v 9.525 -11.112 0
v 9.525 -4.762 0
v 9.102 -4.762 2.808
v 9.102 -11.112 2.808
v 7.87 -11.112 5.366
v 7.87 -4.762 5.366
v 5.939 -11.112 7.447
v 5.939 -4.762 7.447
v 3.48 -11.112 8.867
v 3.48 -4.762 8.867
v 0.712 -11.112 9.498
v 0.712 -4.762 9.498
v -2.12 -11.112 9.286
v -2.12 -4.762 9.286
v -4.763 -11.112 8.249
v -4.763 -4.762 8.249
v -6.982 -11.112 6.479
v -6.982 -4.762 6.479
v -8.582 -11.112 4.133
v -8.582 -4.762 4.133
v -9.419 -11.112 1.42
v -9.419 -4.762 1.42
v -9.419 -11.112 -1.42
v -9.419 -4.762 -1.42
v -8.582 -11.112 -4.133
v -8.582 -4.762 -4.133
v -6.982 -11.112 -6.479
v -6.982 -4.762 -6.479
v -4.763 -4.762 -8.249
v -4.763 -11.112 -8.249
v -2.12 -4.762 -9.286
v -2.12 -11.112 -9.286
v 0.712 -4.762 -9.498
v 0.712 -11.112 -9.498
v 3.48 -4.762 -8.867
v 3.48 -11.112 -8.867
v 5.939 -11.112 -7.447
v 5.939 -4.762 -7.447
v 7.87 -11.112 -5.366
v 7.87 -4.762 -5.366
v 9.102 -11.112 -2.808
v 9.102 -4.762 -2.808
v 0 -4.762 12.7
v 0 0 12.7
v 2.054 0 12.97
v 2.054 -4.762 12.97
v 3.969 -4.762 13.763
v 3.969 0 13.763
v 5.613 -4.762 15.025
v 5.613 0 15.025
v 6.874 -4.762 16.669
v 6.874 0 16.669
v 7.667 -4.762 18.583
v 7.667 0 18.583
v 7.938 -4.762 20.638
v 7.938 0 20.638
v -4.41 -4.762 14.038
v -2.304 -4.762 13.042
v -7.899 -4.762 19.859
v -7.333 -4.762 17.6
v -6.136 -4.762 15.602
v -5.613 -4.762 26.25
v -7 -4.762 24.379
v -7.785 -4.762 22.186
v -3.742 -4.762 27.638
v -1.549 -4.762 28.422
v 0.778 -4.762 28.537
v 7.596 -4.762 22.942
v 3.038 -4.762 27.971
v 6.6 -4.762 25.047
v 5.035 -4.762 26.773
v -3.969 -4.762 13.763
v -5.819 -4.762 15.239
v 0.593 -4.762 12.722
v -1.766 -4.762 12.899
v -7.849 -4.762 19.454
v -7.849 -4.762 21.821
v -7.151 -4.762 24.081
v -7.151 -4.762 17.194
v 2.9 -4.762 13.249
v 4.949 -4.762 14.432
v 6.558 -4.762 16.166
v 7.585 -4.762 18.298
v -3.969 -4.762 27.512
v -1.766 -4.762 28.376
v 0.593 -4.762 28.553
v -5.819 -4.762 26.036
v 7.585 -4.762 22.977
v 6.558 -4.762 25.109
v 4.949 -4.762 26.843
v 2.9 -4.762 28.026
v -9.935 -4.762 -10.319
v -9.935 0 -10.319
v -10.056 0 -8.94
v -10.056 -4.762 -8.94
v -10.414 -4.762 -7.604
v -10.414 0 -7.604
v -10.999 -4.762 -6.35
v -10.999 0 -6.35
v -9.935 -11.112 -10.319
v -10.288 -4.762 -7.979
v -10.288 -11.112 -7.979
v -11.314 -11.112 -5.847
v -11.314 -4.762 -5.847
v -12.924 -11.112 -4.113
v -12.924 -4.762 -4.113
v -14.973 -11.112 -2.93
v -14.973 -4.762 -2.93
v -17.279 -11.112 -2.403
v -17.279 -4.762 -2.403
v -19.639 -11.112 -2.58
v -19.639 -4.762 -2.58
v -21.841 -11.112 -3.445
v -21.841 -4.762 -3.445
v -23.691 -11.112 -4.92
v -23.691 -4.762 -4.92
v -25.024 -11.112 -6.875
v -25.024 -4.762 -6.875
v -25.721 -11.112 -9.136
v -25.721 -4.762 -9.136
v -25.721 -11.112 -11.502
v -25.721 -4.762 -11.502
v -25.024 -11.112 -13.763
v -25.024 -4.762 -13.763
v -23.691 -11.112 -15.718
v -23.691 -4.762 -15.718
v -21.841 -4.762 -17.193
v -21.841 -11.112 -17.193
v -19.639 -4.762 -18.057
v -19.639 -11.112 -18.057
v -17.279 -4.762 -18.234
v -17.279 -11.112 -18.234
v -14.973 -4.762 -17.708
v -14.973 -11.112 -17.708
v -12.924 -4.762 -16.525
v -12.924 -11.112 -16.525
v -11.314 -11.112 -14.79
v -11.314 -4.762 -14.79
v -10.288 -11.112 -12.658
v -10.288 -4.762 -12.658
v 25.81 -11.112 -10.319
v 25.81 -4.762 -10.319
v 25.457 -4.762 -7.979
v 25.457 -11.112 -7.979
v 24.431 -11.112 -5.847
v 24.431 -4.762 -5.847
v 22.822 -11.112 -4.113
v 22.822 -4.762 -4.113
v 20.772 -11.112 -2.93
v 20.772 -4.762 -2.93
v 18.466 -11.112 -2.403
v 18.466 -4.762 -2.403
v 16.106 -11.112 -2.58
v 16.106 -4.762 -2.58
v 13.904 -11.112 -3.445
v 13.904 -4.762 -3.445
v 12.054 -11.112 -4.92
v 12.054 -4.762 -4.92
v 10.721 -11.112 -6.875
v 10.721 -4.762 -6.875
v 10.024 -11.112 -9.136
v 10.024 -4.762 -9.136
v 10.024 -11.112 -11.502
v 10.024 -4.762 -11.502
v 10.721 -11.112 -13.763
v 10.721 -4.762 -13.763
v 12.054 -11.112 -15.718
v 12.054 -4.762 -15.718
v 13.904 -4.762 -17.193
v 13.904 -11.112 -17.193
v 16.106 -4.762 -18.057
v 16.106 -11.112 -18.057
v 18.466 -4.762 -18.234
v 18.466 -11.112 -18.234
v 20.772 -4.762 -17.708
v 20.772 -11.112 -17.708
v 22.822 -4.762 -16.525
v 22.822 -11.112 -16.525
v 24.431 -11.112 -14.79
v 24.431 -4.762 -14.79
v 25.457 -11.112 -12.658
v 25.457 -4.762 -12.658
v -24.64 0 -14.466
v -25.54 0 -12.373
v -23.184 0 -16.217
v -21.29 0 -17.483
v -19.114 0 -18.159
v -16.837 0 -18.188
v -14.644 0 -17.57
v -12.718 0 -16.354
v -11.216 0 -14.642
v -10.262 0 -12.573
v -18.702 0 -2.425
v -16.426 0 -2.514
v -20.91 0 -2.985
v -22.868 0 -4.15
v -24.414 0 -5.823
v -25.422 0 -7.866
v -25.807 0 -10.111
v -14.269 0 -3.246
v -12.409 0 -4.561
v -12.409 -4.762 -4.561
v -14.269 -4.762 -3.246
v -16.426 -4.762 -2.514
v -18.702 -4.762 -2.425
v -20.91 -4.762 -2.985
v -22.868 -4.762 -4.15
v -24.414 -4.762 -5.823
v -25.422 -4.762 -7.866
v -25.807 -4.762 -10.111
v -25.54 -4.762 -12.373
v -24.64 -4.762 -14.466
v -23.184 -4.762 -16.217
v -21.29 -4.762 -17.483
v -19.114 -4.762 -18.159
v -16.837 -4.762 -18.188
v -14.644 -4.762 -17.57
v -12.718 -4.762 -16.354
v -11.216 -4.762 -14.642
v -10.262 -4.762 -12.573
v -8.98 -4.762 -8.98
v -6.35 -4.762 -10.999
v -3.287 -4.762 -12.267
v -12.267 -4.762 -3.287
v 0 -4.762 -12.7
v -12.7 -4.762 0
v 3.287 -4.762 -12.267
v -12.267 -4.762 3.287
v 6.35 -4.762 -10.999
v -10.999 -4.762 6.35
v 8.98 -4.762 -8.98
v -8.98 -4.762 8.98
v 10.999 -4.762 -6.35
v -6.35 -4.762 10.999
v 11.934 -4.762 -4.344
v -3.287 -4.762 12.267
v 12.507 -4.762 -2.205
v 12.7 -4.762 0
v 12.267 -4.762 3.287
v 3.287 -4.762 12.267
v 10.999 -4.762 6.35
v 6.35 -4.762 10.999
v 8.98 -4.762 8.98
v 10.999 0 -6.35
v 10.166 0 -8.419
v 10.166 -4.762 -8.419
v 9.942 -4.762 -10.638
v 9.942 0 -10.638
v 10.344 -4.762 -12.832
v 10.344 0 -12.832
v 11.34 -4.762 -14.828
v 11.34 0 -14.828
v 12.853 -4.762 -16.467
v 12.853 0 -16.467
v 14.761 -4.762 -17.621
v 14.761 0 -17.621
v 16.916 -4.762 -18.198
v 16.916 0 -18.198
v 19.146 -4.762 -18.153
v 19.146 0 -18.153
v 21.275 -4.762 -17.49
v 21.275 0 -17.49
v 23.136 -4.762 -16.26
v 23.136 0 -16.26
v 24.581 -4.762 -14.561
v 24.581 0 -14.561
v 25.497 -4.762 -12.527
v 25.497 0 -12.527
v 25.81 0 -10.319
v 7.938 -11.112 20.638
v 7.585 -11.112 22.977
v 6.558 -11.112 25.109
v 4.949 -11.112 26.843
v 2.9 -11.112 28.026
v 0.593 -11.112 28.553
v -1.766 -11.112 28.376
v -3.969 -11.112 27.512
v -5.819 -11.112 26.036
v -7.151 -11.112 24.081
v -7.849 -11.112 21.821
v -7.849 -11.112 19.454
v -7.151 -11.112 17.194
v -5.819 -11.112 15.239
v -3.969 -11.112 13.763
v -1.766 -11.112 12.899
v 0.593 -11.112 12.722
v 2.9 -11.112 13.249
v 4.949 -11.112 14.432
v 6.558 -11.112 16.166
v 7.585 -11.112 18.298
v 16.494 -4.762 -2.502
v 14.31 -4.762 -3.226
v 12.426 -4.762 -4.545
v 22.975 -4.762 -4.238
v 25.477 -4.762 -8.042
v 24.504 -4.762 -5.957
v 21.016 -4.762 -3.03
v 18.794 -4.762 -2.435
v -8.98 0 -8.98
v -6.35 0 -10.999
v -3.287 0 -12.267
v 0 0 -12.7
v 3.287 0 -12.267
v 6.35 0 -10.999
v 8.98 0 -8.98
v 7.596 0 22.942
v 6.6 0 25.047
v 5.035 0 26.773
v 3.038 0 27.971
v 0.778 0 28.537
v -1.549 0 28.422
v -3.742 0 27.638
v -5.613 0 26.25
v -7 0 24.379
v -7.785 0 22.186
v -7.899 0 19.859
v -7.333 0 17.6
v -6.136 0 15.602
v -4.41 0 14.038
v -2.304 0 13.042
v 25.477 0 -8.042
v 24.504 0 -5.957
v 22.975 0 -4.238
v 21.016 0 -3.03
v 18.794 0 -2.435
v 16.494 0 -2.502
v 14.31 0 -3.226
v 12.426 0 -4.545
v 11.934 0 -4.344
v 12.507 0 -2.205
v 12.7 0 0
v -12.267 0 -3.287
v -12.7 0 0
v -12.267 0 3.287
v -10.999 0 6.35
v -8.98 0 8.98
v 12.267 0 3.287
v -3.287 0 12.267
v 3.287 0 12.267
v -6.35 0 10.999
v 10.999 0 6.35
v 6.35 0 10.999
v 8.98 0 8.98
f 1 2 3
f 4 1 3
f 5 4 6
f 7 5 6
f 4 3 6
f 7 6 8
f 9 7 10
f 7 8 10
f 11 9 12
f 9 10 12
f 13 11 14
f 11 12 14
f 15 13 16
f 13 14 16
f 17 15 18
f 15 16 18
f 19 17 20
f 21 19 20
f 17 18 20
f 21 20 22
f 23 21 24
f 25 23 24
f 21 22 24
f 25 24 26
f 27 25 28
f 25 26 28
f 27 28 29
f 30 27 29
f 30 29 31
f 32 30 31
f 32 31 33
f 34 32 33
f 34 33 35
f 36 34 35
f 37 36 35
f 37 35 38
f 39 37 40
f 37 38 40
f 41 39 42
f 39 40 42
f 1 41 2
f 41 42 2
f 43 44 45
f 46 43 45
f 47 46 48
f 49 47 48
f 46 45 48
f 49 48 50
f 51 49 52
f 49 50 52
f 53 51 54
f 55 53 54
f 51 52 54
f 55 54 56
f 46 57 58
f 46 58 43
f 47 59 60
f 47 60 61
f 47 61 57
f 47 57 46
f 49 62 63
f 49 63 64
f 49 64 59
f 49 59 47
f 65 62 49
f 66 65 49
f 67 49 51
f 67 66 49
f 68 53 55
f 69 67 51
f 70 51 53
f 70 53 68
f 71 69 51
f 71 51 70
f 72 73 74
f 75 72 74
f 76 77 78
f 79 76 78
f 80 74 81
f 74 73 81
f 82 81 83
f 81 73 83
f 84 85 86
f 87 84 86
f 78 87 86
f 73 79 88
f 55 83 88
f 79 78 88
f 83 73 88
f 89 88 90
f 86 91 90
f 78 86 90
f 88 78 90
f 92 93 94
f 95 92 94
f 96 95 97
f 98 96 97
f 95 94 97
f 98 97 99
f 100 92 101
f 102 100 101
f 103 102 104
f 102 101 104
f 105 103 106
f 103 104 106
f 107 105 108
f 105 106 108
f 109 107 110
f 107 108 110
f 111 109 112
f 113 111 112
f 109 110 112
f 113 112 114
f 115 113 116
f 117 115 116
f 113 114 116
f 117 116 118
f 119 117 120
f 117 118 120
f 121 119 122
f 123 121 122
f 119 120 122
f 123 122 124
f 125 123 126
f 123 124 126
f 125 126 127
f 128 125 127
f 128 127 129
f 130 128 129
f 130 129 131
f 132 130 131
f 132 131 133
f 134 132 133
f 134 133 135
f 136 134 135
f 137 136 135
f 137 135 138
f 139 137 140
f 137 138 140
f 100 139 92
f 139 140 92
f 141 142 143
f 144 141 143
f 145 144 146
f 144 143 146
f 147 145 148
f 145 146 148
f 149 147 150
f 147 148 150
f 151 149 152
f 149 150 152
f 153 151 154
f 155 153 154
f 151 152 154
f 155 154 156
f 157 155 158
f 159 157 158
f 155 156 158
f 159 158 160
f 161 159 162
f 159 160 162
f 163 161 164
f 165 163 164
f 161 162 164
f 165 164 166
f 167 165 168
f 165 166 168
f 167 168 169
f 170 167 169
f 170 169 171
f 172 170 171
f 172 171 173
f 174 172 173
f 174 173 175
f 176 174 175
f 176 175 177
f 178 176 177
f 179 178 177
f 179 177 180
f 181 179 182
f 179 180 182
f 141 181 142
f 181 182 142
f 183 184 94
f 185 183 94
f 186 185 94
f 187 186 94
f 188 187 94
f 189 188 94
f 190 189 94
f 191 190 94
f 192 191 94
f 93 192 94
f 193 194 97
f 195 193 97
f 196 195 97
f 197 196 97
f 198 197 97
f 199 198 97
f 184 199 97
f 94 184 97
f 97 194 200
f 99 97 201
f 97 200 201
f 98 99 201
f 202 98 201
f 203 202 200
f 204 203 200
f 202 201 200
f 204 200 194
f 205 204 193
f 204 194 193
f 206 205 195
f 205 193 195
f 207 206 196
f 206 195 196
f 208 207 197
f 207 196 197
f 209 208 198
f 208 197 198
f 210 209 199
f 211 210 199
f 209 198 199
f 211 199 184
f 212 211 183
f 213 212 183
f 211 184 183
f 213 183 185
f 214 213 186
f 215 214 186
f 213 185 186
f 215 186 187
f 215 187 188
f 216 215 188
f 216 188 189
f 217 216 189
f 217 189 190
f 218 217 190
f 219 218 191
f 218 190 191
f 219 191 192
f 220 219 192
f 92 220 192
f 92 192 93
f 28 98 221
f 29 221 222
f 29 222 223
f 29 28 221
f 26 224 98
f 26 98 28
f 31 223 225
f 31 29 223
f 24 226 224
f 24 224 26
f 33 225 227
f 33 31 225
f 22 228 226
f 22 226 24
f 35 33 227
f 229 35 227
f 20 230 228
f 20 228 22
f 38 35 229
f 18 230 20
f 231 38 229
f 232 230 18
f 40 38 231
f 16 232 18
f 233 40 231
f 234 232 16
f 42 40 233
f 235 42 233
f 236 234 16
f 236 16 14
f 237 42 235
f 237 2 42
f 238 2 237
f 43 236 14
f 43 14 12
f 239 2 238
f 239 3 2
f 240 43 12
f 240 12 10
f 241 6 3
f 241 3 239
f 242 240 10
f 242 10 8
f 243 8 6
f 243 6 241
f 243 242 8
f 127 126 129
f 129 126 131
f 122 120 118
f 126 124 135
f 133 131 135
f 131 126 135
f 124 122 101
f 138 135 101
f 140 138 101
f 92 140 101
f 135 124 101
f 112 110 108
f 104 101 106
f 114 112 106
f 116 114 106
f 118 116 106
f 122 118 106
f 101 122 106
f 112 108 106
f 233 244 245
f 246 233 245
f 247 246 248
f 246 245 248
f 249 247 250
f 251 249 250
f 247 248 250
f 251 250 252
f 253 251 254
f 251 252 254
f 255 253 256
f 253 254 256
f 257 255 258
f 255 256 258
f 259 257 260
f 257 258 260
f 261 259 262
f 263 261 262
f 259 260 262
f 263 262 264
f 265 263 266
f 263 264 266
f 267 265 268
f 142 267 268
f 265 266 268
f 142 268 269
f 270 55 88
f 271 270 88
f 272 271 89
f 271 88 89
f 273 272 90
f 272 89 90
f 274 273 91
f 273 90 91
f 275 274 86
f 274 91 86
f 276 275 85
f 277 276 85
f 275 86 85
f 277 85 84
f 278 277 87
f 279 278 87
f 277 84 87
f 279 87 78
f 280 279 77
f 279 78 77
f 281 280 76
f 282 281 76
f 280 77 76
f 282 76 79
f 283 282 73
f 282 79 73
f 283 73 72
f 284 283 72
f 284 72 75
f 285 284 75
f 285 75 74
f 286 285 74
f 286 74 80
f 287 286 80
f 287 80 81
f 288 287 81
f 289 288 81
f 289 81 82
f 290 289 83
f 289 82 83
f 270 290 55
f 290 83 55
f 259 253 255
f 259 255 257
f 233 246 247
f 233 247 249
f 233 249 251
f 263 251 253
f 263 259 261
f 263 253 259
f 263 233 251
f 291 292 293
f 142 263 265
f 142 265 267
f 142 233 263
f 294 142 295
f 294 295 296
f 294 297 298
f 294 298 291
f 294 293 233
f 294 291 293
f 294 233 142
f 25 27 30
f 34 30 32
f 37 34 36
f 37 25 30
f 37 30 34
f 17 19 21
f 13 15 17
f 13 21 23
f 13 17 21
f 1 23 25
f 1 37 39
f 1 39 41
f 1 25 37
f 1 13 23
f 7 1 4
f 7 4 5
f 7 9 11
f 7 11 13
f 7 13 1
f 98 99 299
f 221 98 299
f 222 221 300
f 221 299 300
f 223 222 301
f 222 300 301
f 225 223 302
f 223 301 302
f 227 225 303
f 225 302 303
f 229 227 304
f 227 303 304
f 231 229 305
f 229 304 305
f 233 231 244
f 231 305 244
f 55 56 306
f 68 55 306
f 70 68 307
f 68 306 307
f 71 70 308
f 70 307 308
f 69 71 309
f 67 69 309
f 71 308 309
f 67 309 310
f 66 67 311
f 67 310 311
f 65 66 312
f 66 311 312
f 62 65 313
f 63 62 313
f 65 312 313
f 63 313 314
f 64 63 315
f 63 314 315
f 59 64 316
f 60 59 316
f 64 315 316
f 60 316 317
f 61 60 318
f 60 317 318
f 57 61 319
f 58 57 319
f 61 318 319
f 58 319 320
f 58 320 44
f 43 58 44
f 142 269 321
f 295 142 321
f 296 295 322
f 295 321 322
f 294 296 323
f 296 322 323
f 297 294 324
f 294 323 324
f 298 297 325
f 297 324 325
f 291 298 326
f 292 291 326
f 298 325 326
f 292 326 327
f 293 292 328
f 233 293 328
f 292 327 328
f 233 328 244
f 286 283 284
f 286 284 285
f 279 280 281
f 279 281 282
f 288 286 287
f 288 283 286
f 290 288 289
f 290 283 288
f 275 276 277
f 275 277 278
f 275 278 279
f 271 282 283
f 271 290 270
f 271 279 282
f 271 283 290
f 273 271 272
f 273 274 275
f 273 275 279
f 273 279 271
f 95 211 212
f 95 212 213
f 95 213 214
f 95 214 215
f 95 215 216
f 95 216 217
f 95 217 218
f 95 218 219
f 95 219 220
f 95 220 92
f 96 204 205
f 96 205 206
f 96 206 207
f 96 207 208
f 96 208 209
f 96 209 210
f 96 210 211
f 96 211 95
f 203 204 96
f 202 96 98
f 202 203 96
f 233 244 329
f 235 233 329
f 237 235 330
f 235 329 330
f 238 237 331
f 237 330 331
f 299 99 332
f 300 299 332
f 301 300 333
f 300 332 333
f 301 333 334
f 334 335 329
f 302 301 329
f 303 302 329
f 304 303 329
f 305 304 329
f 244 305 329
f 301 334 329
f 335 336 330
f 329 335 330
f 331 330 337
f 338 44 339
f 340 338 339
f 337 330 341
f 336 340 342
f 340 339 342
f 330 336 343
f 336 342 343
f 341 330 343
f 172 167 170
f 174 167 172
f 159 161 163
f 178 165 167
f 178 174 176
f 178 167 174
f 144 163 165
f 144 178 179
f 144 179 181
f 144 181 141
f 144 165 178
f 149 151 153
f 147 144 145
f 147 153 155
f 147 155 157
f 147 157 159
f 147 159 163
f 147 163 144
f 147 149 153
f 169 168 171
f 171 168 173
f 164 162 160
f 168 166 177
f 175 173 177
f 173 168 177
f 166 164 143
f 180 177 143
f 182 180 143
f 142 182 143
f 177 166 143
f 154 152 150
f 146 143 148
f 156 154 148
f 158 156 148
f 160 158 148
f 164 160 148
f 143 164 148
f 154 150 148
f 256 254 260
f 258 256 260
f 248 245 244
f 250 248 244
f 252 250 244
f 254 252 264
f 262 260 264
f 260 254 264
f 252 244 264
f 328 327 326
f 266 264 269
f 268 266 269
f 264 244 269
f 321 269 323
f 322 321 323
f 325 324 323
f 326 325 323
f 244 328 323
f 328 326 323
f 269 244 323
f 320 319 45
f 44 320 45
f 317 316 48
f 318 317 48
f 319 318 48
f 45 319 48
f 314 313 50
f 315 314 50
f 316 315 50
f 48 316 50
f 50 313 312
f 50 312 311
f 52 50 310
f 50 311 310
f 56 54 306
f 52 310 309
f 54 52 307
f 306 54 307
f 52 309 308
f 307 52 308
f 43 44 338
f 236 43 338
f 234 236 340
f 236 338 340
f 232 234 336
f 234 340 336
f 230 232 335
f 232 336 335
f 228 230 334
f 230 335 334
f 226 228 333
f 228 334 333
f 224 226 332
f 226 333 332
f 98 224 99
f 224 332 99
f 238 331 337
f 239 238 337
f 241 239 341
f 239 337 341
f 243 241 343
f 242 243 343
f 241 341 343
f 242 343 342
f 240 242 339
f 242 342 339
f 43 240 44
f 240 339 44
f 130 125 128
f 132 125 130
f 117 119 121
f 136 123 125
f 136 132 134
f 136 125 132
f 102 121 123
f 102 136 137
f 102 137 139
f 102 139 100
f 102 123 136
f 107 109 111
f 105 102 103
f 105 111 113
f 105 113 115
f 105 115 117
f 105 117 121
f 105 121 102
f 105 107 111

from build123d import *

# Parameters (mm, degrees)
F1_DEPTH = 4.7625
F2_R     = 9.525
F3_DEPTH = 6.35
F2_R_2   = 7.9375


with BuildPart() as f1:
    # F0 (on Front) → F1 (new body)
    with BuildSketch(Plane.XZ):
        with BuildLine():
            ThreePointArc((10.9985225391, -6.3500001541), (12.2672579708, -3.2870019587), (12.7, 0))
            ThreePointArc((12.7, 0), (8.9802561389, 8.9802561032), (5.05e-08, 12.7))
            ThreePointArc((5.05e-08, 12.7), (-10.9985226051, 6.3500000397), (-10.9985226487, -6.3499999643))
            ThreePointArc((-10.9985226487, -6.3499999643), (-1.096e-07, -12.7), (10.9985225391, -6.3500001541))
        make_face()
    extrude(amount=F1_DEPTH)

    # F2 (on face) → F3 (join)
    with BuildSketch(Plane.XZ.offset(4.7625)):
        Circle(F2_R)
    extrude(amount=F3_DEPTH)


with BuildPart() as f1b:
    # F0 (on Front) → F1, piece 2 (new body)
    with BuildSketch(Plane.XZ):
        with BuildLine():
            ThreePointArc((25.8100992706, -10.31875), (19.9269753552, -2.6517137308), (10.9985225391, -6.3500001541))
            ThreePointArc((10.9985225391, -6.3500001541), (15.818223186, -17.9857862692), (25.8100992706, -10.31875))
        make_face()
    extrude(amount=F1_DEPTH)


with BuildPart() as f1c:
    # F0 (on Front) → F1, piece 3 (new body)
    with BuildSketch(Plane.XZ):
        with BuildLine():
            ThreePointArc((-9.9350992706, -10.31875), (-10.2055630298, -8.2643738096), (-10.9985226487, -6.3499999643))
            ThreePointArc((-10.9985226487, -6.3499999643), (-25.5396355114, -12.3731261904), (-9.9350992706, -10.31875))
        make_face()
    extrude(amount=F1_DEPTH)


with BuildPart() as f1d:
    # F0 (on Front) → F1, piece 4 (new body)
    with BuildSketch(Plane.XZ):
        with BuildLine():
            ThreePointArc((7.9375, 20.6375), (-5.6126600935, 26.2501600578), (5.05e-08, 12.7))
            ThreePointArc((5.05e-08, 12.7), (5.6126600935, 15.0248399422), (7.9375, 20.6375))
        make_face()
    extrude(amount=F1_DEPTH)


with BuildPart() as f3:
    # F2 (on face) → F3, piece 2 (new body)
    with BuildSketch(Plane.XZ.offset(4.7625)):
        with Locations((-17.8725992706, -10.31875)):
            Circle(F2_R_2)
    extrude(amount=F3_DEPTH)


with BuildPart() as f3b:
    # F2 (on face) → F3, piece 3 (new body)
    with BuildSketch(Plane.XZ.offset(4.7625)):
        with Locations((0, 20.6375)):
            Circle(F2_R_2)
    extrude(amount=F3_DEPTH)


with BuildPart() as f3c:
    # F2 (on face) → F3, piece 4 (new body)
    with BuildSketch(Plane.XZ.offset(4.7625)):
        with Locations((17.8725992706, -10.31875)):
            Circle(F2_R_2)
    extrude(amount=F3_DEPTH)


solid = Compound([f1.part, f1b.part, f1c.part, f1d.part, f3.part, f3b.part, f3c.part])
